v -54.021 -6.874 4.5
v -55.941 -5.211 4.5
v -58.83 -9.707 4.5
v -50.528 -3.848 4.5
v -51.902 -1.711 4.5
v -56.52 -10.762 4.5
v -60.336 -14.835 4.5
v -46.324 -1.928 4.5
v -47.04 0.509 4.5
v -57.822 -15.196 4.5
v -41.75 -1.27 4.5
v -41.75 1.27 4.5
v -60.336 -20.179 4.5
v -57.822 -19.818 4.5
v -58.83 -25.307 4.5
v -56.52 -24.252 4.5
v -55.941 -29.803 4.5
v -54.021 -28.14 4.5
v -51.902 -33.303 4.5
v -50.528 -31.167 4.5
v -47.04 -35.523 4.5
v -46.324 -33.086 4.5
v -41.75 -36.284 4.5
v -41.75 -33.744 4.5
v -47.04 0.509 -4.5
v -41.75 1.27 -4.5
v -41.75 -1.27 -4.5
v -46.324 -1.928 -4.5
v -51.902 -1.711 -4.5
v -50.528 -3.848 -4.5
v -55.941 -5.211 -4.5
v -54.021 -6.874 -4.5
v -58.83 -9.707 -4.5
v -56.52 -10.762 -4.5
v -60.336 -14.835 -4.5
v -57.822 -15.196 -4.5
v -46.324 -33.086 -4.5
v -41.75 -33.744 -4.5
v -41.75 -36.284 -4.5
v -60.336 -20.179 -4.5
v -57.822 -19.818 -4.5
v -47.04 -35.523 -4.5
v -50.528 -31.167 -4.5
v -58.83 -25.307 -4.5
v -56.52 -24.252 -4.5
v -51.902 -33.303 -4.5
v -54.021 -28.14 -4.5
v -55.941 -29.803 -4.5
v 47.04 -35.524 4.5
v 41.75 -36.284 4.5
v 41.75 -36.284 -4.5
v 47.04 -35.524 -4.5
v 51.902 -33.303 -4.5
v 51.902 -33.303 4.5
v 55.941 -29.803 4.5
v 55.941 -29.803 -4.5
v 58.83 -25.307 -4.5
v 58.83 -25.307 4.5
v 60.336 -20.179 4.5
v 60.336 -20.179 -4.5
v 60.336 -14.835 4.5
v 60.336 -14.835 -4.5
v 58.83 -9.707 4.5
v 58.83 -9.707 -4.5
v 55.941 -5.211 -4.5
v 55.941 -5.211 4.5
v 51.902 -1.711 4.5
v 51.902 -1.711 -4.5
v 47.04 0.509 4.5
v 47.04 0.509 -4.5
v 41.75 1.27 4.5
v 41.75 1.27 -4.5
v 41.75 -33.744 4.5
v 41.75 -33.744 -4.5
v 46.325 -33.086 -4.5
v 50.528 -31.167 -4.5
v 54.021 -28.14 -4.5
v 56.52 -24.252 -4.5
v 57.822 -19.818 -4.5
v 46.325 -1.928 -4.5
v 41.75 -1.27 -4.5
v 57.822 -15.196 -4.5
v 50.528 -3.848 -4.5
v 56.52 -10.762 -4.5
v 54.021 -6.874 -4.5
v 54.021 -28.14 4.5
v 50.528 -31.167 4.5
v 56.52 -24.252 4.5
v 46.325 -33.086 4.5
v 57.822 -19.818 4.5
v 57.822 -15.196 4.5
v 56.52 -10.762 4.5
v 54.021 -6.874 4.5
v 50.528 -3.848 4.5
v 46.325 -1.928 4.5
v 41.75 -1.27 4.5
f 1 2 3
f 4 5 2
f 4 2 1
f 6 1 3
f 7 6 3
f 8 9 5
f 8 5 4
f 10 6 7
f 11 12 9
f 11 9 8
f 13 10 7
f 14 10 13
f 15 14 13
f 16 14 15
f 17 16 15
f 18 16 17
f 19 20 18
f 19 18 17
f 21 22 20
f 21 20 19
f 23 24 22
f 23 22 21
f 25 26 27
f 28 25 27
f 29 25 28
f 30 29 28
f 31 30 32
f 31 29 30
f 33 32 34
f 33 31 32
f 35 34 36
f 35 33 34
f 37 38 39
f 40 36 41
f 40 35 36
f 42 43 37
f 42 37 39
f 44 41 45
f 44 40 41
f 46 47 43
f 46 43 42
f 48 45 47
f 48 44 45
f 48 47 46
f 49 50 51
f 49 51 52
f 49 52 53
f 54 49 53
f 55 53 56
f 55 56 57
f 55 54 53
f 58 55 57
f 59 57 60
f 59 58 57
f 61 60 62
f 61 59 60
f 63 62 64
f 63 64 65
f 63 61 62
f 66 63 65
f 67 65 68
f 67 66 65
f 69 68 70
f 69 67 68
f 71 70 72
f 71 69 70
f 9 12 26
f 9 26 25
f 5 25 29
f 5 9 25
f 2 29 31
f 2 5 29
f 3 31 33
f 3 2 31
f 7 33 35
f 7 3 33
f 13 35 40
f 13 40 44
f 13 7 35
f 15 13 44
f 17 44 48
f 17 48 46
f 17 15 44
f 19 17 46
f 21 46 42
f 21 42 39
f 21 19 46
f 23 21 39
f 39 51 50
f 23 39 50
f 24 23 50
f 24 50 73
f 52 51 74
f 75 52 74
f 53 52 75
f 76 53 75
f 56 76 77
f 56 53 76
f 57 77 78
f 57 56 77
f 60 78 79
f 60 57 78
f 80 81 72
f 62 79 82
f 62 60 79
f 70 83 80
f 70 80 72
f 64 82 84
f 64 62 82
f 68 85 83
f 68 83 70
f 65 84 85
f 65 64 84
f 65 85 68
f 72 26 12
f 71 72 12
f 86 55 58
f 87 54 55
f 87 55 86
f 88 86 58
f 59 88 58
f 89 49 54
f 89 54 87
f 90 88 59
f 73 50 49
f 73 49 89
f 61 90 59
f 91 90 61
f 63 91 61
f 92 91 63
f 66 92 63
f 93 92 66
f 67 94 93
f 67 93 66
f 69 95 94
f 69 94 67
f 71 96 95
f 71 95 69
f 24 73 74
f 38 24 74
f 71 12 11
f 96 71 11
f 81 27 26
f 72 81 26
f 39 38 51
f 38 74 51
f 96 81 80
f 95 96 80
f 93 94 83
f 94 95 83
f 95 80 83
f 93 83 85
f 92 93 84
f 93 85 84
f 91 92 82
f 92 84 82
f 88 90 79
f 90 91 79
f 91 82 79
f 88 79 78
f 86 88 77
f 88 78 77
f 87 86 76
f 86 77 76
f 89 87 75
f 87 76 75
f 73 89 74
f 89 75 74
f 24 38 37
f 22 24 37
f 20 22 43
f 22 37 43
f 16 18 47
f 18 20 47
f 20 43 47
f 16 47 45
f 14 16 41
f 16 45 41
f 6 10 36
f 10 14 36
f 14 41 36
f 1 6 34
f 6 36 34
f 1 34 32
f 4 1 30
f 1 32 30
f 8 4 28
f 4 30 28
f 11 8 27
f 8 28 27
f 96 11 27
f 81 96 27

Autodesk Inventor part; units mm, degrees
ref_plane "YZ Plane" through (0, 0, 0) normal (1, 0, 0) x (0, 1, 0)
ref_plane "XZ Plane" through (0, 0, 0) normal (0, 1, 0) x (-1, 0, 0)
ref_plane "XY Plane" through (0, 0, 0) normal (0, 0, 1) x (1, 0, 0)
sketch "Sketch1" plane through (0, 0, 0) normal (1, 0, 0) x (0, 1, 0)
  line L0 (1.27, -4.5) -> (-1.27, -4.5)
  line L1 (-1.27, -4.5) -> (-1.27, 4.5)
  line L2 (-1.27, 4.5) -> (1.27, 4.5)
  line L3 (1.27, 4.5) -> (1.27, -4.5)
  line L4 (1.27, -4.5) -> (-1.27, 4.5) construction
  line L5 (-1.27, -4.5) -> (1.27, 4.5) construction
  point P0 (0, 0)
  point P1 (0, 0)
  dimension "d0" = 9
  dimension "d1" = 2.54
sketch "Sketch2" plane through (0, 0, 0) normal (0, 0, 1) x (1, 0, 0)
  arc A0 (-41.75, 0) -> (-41.75, -35.0141) centre (-41.75, -17.507) ccw
  arc A1 (41.75, -35.0141) -> (41.75, 0) centre (41.75, -17.507) ccw
  line L0 (-41.75, 0) -> (41.75, 0)
  line L1 (41.75, -35.0141) -> (-41.75, -35.0141)
  point P0 (0, 0)
  point P1 (0, 0)
  dimension "d2" = 83.5
  dimension "d3" = 17.507
sweep "Sweep1" add profiles "Sketch1" path "Sketch2"
properties part number "55t_Belt" material "Rubber"
